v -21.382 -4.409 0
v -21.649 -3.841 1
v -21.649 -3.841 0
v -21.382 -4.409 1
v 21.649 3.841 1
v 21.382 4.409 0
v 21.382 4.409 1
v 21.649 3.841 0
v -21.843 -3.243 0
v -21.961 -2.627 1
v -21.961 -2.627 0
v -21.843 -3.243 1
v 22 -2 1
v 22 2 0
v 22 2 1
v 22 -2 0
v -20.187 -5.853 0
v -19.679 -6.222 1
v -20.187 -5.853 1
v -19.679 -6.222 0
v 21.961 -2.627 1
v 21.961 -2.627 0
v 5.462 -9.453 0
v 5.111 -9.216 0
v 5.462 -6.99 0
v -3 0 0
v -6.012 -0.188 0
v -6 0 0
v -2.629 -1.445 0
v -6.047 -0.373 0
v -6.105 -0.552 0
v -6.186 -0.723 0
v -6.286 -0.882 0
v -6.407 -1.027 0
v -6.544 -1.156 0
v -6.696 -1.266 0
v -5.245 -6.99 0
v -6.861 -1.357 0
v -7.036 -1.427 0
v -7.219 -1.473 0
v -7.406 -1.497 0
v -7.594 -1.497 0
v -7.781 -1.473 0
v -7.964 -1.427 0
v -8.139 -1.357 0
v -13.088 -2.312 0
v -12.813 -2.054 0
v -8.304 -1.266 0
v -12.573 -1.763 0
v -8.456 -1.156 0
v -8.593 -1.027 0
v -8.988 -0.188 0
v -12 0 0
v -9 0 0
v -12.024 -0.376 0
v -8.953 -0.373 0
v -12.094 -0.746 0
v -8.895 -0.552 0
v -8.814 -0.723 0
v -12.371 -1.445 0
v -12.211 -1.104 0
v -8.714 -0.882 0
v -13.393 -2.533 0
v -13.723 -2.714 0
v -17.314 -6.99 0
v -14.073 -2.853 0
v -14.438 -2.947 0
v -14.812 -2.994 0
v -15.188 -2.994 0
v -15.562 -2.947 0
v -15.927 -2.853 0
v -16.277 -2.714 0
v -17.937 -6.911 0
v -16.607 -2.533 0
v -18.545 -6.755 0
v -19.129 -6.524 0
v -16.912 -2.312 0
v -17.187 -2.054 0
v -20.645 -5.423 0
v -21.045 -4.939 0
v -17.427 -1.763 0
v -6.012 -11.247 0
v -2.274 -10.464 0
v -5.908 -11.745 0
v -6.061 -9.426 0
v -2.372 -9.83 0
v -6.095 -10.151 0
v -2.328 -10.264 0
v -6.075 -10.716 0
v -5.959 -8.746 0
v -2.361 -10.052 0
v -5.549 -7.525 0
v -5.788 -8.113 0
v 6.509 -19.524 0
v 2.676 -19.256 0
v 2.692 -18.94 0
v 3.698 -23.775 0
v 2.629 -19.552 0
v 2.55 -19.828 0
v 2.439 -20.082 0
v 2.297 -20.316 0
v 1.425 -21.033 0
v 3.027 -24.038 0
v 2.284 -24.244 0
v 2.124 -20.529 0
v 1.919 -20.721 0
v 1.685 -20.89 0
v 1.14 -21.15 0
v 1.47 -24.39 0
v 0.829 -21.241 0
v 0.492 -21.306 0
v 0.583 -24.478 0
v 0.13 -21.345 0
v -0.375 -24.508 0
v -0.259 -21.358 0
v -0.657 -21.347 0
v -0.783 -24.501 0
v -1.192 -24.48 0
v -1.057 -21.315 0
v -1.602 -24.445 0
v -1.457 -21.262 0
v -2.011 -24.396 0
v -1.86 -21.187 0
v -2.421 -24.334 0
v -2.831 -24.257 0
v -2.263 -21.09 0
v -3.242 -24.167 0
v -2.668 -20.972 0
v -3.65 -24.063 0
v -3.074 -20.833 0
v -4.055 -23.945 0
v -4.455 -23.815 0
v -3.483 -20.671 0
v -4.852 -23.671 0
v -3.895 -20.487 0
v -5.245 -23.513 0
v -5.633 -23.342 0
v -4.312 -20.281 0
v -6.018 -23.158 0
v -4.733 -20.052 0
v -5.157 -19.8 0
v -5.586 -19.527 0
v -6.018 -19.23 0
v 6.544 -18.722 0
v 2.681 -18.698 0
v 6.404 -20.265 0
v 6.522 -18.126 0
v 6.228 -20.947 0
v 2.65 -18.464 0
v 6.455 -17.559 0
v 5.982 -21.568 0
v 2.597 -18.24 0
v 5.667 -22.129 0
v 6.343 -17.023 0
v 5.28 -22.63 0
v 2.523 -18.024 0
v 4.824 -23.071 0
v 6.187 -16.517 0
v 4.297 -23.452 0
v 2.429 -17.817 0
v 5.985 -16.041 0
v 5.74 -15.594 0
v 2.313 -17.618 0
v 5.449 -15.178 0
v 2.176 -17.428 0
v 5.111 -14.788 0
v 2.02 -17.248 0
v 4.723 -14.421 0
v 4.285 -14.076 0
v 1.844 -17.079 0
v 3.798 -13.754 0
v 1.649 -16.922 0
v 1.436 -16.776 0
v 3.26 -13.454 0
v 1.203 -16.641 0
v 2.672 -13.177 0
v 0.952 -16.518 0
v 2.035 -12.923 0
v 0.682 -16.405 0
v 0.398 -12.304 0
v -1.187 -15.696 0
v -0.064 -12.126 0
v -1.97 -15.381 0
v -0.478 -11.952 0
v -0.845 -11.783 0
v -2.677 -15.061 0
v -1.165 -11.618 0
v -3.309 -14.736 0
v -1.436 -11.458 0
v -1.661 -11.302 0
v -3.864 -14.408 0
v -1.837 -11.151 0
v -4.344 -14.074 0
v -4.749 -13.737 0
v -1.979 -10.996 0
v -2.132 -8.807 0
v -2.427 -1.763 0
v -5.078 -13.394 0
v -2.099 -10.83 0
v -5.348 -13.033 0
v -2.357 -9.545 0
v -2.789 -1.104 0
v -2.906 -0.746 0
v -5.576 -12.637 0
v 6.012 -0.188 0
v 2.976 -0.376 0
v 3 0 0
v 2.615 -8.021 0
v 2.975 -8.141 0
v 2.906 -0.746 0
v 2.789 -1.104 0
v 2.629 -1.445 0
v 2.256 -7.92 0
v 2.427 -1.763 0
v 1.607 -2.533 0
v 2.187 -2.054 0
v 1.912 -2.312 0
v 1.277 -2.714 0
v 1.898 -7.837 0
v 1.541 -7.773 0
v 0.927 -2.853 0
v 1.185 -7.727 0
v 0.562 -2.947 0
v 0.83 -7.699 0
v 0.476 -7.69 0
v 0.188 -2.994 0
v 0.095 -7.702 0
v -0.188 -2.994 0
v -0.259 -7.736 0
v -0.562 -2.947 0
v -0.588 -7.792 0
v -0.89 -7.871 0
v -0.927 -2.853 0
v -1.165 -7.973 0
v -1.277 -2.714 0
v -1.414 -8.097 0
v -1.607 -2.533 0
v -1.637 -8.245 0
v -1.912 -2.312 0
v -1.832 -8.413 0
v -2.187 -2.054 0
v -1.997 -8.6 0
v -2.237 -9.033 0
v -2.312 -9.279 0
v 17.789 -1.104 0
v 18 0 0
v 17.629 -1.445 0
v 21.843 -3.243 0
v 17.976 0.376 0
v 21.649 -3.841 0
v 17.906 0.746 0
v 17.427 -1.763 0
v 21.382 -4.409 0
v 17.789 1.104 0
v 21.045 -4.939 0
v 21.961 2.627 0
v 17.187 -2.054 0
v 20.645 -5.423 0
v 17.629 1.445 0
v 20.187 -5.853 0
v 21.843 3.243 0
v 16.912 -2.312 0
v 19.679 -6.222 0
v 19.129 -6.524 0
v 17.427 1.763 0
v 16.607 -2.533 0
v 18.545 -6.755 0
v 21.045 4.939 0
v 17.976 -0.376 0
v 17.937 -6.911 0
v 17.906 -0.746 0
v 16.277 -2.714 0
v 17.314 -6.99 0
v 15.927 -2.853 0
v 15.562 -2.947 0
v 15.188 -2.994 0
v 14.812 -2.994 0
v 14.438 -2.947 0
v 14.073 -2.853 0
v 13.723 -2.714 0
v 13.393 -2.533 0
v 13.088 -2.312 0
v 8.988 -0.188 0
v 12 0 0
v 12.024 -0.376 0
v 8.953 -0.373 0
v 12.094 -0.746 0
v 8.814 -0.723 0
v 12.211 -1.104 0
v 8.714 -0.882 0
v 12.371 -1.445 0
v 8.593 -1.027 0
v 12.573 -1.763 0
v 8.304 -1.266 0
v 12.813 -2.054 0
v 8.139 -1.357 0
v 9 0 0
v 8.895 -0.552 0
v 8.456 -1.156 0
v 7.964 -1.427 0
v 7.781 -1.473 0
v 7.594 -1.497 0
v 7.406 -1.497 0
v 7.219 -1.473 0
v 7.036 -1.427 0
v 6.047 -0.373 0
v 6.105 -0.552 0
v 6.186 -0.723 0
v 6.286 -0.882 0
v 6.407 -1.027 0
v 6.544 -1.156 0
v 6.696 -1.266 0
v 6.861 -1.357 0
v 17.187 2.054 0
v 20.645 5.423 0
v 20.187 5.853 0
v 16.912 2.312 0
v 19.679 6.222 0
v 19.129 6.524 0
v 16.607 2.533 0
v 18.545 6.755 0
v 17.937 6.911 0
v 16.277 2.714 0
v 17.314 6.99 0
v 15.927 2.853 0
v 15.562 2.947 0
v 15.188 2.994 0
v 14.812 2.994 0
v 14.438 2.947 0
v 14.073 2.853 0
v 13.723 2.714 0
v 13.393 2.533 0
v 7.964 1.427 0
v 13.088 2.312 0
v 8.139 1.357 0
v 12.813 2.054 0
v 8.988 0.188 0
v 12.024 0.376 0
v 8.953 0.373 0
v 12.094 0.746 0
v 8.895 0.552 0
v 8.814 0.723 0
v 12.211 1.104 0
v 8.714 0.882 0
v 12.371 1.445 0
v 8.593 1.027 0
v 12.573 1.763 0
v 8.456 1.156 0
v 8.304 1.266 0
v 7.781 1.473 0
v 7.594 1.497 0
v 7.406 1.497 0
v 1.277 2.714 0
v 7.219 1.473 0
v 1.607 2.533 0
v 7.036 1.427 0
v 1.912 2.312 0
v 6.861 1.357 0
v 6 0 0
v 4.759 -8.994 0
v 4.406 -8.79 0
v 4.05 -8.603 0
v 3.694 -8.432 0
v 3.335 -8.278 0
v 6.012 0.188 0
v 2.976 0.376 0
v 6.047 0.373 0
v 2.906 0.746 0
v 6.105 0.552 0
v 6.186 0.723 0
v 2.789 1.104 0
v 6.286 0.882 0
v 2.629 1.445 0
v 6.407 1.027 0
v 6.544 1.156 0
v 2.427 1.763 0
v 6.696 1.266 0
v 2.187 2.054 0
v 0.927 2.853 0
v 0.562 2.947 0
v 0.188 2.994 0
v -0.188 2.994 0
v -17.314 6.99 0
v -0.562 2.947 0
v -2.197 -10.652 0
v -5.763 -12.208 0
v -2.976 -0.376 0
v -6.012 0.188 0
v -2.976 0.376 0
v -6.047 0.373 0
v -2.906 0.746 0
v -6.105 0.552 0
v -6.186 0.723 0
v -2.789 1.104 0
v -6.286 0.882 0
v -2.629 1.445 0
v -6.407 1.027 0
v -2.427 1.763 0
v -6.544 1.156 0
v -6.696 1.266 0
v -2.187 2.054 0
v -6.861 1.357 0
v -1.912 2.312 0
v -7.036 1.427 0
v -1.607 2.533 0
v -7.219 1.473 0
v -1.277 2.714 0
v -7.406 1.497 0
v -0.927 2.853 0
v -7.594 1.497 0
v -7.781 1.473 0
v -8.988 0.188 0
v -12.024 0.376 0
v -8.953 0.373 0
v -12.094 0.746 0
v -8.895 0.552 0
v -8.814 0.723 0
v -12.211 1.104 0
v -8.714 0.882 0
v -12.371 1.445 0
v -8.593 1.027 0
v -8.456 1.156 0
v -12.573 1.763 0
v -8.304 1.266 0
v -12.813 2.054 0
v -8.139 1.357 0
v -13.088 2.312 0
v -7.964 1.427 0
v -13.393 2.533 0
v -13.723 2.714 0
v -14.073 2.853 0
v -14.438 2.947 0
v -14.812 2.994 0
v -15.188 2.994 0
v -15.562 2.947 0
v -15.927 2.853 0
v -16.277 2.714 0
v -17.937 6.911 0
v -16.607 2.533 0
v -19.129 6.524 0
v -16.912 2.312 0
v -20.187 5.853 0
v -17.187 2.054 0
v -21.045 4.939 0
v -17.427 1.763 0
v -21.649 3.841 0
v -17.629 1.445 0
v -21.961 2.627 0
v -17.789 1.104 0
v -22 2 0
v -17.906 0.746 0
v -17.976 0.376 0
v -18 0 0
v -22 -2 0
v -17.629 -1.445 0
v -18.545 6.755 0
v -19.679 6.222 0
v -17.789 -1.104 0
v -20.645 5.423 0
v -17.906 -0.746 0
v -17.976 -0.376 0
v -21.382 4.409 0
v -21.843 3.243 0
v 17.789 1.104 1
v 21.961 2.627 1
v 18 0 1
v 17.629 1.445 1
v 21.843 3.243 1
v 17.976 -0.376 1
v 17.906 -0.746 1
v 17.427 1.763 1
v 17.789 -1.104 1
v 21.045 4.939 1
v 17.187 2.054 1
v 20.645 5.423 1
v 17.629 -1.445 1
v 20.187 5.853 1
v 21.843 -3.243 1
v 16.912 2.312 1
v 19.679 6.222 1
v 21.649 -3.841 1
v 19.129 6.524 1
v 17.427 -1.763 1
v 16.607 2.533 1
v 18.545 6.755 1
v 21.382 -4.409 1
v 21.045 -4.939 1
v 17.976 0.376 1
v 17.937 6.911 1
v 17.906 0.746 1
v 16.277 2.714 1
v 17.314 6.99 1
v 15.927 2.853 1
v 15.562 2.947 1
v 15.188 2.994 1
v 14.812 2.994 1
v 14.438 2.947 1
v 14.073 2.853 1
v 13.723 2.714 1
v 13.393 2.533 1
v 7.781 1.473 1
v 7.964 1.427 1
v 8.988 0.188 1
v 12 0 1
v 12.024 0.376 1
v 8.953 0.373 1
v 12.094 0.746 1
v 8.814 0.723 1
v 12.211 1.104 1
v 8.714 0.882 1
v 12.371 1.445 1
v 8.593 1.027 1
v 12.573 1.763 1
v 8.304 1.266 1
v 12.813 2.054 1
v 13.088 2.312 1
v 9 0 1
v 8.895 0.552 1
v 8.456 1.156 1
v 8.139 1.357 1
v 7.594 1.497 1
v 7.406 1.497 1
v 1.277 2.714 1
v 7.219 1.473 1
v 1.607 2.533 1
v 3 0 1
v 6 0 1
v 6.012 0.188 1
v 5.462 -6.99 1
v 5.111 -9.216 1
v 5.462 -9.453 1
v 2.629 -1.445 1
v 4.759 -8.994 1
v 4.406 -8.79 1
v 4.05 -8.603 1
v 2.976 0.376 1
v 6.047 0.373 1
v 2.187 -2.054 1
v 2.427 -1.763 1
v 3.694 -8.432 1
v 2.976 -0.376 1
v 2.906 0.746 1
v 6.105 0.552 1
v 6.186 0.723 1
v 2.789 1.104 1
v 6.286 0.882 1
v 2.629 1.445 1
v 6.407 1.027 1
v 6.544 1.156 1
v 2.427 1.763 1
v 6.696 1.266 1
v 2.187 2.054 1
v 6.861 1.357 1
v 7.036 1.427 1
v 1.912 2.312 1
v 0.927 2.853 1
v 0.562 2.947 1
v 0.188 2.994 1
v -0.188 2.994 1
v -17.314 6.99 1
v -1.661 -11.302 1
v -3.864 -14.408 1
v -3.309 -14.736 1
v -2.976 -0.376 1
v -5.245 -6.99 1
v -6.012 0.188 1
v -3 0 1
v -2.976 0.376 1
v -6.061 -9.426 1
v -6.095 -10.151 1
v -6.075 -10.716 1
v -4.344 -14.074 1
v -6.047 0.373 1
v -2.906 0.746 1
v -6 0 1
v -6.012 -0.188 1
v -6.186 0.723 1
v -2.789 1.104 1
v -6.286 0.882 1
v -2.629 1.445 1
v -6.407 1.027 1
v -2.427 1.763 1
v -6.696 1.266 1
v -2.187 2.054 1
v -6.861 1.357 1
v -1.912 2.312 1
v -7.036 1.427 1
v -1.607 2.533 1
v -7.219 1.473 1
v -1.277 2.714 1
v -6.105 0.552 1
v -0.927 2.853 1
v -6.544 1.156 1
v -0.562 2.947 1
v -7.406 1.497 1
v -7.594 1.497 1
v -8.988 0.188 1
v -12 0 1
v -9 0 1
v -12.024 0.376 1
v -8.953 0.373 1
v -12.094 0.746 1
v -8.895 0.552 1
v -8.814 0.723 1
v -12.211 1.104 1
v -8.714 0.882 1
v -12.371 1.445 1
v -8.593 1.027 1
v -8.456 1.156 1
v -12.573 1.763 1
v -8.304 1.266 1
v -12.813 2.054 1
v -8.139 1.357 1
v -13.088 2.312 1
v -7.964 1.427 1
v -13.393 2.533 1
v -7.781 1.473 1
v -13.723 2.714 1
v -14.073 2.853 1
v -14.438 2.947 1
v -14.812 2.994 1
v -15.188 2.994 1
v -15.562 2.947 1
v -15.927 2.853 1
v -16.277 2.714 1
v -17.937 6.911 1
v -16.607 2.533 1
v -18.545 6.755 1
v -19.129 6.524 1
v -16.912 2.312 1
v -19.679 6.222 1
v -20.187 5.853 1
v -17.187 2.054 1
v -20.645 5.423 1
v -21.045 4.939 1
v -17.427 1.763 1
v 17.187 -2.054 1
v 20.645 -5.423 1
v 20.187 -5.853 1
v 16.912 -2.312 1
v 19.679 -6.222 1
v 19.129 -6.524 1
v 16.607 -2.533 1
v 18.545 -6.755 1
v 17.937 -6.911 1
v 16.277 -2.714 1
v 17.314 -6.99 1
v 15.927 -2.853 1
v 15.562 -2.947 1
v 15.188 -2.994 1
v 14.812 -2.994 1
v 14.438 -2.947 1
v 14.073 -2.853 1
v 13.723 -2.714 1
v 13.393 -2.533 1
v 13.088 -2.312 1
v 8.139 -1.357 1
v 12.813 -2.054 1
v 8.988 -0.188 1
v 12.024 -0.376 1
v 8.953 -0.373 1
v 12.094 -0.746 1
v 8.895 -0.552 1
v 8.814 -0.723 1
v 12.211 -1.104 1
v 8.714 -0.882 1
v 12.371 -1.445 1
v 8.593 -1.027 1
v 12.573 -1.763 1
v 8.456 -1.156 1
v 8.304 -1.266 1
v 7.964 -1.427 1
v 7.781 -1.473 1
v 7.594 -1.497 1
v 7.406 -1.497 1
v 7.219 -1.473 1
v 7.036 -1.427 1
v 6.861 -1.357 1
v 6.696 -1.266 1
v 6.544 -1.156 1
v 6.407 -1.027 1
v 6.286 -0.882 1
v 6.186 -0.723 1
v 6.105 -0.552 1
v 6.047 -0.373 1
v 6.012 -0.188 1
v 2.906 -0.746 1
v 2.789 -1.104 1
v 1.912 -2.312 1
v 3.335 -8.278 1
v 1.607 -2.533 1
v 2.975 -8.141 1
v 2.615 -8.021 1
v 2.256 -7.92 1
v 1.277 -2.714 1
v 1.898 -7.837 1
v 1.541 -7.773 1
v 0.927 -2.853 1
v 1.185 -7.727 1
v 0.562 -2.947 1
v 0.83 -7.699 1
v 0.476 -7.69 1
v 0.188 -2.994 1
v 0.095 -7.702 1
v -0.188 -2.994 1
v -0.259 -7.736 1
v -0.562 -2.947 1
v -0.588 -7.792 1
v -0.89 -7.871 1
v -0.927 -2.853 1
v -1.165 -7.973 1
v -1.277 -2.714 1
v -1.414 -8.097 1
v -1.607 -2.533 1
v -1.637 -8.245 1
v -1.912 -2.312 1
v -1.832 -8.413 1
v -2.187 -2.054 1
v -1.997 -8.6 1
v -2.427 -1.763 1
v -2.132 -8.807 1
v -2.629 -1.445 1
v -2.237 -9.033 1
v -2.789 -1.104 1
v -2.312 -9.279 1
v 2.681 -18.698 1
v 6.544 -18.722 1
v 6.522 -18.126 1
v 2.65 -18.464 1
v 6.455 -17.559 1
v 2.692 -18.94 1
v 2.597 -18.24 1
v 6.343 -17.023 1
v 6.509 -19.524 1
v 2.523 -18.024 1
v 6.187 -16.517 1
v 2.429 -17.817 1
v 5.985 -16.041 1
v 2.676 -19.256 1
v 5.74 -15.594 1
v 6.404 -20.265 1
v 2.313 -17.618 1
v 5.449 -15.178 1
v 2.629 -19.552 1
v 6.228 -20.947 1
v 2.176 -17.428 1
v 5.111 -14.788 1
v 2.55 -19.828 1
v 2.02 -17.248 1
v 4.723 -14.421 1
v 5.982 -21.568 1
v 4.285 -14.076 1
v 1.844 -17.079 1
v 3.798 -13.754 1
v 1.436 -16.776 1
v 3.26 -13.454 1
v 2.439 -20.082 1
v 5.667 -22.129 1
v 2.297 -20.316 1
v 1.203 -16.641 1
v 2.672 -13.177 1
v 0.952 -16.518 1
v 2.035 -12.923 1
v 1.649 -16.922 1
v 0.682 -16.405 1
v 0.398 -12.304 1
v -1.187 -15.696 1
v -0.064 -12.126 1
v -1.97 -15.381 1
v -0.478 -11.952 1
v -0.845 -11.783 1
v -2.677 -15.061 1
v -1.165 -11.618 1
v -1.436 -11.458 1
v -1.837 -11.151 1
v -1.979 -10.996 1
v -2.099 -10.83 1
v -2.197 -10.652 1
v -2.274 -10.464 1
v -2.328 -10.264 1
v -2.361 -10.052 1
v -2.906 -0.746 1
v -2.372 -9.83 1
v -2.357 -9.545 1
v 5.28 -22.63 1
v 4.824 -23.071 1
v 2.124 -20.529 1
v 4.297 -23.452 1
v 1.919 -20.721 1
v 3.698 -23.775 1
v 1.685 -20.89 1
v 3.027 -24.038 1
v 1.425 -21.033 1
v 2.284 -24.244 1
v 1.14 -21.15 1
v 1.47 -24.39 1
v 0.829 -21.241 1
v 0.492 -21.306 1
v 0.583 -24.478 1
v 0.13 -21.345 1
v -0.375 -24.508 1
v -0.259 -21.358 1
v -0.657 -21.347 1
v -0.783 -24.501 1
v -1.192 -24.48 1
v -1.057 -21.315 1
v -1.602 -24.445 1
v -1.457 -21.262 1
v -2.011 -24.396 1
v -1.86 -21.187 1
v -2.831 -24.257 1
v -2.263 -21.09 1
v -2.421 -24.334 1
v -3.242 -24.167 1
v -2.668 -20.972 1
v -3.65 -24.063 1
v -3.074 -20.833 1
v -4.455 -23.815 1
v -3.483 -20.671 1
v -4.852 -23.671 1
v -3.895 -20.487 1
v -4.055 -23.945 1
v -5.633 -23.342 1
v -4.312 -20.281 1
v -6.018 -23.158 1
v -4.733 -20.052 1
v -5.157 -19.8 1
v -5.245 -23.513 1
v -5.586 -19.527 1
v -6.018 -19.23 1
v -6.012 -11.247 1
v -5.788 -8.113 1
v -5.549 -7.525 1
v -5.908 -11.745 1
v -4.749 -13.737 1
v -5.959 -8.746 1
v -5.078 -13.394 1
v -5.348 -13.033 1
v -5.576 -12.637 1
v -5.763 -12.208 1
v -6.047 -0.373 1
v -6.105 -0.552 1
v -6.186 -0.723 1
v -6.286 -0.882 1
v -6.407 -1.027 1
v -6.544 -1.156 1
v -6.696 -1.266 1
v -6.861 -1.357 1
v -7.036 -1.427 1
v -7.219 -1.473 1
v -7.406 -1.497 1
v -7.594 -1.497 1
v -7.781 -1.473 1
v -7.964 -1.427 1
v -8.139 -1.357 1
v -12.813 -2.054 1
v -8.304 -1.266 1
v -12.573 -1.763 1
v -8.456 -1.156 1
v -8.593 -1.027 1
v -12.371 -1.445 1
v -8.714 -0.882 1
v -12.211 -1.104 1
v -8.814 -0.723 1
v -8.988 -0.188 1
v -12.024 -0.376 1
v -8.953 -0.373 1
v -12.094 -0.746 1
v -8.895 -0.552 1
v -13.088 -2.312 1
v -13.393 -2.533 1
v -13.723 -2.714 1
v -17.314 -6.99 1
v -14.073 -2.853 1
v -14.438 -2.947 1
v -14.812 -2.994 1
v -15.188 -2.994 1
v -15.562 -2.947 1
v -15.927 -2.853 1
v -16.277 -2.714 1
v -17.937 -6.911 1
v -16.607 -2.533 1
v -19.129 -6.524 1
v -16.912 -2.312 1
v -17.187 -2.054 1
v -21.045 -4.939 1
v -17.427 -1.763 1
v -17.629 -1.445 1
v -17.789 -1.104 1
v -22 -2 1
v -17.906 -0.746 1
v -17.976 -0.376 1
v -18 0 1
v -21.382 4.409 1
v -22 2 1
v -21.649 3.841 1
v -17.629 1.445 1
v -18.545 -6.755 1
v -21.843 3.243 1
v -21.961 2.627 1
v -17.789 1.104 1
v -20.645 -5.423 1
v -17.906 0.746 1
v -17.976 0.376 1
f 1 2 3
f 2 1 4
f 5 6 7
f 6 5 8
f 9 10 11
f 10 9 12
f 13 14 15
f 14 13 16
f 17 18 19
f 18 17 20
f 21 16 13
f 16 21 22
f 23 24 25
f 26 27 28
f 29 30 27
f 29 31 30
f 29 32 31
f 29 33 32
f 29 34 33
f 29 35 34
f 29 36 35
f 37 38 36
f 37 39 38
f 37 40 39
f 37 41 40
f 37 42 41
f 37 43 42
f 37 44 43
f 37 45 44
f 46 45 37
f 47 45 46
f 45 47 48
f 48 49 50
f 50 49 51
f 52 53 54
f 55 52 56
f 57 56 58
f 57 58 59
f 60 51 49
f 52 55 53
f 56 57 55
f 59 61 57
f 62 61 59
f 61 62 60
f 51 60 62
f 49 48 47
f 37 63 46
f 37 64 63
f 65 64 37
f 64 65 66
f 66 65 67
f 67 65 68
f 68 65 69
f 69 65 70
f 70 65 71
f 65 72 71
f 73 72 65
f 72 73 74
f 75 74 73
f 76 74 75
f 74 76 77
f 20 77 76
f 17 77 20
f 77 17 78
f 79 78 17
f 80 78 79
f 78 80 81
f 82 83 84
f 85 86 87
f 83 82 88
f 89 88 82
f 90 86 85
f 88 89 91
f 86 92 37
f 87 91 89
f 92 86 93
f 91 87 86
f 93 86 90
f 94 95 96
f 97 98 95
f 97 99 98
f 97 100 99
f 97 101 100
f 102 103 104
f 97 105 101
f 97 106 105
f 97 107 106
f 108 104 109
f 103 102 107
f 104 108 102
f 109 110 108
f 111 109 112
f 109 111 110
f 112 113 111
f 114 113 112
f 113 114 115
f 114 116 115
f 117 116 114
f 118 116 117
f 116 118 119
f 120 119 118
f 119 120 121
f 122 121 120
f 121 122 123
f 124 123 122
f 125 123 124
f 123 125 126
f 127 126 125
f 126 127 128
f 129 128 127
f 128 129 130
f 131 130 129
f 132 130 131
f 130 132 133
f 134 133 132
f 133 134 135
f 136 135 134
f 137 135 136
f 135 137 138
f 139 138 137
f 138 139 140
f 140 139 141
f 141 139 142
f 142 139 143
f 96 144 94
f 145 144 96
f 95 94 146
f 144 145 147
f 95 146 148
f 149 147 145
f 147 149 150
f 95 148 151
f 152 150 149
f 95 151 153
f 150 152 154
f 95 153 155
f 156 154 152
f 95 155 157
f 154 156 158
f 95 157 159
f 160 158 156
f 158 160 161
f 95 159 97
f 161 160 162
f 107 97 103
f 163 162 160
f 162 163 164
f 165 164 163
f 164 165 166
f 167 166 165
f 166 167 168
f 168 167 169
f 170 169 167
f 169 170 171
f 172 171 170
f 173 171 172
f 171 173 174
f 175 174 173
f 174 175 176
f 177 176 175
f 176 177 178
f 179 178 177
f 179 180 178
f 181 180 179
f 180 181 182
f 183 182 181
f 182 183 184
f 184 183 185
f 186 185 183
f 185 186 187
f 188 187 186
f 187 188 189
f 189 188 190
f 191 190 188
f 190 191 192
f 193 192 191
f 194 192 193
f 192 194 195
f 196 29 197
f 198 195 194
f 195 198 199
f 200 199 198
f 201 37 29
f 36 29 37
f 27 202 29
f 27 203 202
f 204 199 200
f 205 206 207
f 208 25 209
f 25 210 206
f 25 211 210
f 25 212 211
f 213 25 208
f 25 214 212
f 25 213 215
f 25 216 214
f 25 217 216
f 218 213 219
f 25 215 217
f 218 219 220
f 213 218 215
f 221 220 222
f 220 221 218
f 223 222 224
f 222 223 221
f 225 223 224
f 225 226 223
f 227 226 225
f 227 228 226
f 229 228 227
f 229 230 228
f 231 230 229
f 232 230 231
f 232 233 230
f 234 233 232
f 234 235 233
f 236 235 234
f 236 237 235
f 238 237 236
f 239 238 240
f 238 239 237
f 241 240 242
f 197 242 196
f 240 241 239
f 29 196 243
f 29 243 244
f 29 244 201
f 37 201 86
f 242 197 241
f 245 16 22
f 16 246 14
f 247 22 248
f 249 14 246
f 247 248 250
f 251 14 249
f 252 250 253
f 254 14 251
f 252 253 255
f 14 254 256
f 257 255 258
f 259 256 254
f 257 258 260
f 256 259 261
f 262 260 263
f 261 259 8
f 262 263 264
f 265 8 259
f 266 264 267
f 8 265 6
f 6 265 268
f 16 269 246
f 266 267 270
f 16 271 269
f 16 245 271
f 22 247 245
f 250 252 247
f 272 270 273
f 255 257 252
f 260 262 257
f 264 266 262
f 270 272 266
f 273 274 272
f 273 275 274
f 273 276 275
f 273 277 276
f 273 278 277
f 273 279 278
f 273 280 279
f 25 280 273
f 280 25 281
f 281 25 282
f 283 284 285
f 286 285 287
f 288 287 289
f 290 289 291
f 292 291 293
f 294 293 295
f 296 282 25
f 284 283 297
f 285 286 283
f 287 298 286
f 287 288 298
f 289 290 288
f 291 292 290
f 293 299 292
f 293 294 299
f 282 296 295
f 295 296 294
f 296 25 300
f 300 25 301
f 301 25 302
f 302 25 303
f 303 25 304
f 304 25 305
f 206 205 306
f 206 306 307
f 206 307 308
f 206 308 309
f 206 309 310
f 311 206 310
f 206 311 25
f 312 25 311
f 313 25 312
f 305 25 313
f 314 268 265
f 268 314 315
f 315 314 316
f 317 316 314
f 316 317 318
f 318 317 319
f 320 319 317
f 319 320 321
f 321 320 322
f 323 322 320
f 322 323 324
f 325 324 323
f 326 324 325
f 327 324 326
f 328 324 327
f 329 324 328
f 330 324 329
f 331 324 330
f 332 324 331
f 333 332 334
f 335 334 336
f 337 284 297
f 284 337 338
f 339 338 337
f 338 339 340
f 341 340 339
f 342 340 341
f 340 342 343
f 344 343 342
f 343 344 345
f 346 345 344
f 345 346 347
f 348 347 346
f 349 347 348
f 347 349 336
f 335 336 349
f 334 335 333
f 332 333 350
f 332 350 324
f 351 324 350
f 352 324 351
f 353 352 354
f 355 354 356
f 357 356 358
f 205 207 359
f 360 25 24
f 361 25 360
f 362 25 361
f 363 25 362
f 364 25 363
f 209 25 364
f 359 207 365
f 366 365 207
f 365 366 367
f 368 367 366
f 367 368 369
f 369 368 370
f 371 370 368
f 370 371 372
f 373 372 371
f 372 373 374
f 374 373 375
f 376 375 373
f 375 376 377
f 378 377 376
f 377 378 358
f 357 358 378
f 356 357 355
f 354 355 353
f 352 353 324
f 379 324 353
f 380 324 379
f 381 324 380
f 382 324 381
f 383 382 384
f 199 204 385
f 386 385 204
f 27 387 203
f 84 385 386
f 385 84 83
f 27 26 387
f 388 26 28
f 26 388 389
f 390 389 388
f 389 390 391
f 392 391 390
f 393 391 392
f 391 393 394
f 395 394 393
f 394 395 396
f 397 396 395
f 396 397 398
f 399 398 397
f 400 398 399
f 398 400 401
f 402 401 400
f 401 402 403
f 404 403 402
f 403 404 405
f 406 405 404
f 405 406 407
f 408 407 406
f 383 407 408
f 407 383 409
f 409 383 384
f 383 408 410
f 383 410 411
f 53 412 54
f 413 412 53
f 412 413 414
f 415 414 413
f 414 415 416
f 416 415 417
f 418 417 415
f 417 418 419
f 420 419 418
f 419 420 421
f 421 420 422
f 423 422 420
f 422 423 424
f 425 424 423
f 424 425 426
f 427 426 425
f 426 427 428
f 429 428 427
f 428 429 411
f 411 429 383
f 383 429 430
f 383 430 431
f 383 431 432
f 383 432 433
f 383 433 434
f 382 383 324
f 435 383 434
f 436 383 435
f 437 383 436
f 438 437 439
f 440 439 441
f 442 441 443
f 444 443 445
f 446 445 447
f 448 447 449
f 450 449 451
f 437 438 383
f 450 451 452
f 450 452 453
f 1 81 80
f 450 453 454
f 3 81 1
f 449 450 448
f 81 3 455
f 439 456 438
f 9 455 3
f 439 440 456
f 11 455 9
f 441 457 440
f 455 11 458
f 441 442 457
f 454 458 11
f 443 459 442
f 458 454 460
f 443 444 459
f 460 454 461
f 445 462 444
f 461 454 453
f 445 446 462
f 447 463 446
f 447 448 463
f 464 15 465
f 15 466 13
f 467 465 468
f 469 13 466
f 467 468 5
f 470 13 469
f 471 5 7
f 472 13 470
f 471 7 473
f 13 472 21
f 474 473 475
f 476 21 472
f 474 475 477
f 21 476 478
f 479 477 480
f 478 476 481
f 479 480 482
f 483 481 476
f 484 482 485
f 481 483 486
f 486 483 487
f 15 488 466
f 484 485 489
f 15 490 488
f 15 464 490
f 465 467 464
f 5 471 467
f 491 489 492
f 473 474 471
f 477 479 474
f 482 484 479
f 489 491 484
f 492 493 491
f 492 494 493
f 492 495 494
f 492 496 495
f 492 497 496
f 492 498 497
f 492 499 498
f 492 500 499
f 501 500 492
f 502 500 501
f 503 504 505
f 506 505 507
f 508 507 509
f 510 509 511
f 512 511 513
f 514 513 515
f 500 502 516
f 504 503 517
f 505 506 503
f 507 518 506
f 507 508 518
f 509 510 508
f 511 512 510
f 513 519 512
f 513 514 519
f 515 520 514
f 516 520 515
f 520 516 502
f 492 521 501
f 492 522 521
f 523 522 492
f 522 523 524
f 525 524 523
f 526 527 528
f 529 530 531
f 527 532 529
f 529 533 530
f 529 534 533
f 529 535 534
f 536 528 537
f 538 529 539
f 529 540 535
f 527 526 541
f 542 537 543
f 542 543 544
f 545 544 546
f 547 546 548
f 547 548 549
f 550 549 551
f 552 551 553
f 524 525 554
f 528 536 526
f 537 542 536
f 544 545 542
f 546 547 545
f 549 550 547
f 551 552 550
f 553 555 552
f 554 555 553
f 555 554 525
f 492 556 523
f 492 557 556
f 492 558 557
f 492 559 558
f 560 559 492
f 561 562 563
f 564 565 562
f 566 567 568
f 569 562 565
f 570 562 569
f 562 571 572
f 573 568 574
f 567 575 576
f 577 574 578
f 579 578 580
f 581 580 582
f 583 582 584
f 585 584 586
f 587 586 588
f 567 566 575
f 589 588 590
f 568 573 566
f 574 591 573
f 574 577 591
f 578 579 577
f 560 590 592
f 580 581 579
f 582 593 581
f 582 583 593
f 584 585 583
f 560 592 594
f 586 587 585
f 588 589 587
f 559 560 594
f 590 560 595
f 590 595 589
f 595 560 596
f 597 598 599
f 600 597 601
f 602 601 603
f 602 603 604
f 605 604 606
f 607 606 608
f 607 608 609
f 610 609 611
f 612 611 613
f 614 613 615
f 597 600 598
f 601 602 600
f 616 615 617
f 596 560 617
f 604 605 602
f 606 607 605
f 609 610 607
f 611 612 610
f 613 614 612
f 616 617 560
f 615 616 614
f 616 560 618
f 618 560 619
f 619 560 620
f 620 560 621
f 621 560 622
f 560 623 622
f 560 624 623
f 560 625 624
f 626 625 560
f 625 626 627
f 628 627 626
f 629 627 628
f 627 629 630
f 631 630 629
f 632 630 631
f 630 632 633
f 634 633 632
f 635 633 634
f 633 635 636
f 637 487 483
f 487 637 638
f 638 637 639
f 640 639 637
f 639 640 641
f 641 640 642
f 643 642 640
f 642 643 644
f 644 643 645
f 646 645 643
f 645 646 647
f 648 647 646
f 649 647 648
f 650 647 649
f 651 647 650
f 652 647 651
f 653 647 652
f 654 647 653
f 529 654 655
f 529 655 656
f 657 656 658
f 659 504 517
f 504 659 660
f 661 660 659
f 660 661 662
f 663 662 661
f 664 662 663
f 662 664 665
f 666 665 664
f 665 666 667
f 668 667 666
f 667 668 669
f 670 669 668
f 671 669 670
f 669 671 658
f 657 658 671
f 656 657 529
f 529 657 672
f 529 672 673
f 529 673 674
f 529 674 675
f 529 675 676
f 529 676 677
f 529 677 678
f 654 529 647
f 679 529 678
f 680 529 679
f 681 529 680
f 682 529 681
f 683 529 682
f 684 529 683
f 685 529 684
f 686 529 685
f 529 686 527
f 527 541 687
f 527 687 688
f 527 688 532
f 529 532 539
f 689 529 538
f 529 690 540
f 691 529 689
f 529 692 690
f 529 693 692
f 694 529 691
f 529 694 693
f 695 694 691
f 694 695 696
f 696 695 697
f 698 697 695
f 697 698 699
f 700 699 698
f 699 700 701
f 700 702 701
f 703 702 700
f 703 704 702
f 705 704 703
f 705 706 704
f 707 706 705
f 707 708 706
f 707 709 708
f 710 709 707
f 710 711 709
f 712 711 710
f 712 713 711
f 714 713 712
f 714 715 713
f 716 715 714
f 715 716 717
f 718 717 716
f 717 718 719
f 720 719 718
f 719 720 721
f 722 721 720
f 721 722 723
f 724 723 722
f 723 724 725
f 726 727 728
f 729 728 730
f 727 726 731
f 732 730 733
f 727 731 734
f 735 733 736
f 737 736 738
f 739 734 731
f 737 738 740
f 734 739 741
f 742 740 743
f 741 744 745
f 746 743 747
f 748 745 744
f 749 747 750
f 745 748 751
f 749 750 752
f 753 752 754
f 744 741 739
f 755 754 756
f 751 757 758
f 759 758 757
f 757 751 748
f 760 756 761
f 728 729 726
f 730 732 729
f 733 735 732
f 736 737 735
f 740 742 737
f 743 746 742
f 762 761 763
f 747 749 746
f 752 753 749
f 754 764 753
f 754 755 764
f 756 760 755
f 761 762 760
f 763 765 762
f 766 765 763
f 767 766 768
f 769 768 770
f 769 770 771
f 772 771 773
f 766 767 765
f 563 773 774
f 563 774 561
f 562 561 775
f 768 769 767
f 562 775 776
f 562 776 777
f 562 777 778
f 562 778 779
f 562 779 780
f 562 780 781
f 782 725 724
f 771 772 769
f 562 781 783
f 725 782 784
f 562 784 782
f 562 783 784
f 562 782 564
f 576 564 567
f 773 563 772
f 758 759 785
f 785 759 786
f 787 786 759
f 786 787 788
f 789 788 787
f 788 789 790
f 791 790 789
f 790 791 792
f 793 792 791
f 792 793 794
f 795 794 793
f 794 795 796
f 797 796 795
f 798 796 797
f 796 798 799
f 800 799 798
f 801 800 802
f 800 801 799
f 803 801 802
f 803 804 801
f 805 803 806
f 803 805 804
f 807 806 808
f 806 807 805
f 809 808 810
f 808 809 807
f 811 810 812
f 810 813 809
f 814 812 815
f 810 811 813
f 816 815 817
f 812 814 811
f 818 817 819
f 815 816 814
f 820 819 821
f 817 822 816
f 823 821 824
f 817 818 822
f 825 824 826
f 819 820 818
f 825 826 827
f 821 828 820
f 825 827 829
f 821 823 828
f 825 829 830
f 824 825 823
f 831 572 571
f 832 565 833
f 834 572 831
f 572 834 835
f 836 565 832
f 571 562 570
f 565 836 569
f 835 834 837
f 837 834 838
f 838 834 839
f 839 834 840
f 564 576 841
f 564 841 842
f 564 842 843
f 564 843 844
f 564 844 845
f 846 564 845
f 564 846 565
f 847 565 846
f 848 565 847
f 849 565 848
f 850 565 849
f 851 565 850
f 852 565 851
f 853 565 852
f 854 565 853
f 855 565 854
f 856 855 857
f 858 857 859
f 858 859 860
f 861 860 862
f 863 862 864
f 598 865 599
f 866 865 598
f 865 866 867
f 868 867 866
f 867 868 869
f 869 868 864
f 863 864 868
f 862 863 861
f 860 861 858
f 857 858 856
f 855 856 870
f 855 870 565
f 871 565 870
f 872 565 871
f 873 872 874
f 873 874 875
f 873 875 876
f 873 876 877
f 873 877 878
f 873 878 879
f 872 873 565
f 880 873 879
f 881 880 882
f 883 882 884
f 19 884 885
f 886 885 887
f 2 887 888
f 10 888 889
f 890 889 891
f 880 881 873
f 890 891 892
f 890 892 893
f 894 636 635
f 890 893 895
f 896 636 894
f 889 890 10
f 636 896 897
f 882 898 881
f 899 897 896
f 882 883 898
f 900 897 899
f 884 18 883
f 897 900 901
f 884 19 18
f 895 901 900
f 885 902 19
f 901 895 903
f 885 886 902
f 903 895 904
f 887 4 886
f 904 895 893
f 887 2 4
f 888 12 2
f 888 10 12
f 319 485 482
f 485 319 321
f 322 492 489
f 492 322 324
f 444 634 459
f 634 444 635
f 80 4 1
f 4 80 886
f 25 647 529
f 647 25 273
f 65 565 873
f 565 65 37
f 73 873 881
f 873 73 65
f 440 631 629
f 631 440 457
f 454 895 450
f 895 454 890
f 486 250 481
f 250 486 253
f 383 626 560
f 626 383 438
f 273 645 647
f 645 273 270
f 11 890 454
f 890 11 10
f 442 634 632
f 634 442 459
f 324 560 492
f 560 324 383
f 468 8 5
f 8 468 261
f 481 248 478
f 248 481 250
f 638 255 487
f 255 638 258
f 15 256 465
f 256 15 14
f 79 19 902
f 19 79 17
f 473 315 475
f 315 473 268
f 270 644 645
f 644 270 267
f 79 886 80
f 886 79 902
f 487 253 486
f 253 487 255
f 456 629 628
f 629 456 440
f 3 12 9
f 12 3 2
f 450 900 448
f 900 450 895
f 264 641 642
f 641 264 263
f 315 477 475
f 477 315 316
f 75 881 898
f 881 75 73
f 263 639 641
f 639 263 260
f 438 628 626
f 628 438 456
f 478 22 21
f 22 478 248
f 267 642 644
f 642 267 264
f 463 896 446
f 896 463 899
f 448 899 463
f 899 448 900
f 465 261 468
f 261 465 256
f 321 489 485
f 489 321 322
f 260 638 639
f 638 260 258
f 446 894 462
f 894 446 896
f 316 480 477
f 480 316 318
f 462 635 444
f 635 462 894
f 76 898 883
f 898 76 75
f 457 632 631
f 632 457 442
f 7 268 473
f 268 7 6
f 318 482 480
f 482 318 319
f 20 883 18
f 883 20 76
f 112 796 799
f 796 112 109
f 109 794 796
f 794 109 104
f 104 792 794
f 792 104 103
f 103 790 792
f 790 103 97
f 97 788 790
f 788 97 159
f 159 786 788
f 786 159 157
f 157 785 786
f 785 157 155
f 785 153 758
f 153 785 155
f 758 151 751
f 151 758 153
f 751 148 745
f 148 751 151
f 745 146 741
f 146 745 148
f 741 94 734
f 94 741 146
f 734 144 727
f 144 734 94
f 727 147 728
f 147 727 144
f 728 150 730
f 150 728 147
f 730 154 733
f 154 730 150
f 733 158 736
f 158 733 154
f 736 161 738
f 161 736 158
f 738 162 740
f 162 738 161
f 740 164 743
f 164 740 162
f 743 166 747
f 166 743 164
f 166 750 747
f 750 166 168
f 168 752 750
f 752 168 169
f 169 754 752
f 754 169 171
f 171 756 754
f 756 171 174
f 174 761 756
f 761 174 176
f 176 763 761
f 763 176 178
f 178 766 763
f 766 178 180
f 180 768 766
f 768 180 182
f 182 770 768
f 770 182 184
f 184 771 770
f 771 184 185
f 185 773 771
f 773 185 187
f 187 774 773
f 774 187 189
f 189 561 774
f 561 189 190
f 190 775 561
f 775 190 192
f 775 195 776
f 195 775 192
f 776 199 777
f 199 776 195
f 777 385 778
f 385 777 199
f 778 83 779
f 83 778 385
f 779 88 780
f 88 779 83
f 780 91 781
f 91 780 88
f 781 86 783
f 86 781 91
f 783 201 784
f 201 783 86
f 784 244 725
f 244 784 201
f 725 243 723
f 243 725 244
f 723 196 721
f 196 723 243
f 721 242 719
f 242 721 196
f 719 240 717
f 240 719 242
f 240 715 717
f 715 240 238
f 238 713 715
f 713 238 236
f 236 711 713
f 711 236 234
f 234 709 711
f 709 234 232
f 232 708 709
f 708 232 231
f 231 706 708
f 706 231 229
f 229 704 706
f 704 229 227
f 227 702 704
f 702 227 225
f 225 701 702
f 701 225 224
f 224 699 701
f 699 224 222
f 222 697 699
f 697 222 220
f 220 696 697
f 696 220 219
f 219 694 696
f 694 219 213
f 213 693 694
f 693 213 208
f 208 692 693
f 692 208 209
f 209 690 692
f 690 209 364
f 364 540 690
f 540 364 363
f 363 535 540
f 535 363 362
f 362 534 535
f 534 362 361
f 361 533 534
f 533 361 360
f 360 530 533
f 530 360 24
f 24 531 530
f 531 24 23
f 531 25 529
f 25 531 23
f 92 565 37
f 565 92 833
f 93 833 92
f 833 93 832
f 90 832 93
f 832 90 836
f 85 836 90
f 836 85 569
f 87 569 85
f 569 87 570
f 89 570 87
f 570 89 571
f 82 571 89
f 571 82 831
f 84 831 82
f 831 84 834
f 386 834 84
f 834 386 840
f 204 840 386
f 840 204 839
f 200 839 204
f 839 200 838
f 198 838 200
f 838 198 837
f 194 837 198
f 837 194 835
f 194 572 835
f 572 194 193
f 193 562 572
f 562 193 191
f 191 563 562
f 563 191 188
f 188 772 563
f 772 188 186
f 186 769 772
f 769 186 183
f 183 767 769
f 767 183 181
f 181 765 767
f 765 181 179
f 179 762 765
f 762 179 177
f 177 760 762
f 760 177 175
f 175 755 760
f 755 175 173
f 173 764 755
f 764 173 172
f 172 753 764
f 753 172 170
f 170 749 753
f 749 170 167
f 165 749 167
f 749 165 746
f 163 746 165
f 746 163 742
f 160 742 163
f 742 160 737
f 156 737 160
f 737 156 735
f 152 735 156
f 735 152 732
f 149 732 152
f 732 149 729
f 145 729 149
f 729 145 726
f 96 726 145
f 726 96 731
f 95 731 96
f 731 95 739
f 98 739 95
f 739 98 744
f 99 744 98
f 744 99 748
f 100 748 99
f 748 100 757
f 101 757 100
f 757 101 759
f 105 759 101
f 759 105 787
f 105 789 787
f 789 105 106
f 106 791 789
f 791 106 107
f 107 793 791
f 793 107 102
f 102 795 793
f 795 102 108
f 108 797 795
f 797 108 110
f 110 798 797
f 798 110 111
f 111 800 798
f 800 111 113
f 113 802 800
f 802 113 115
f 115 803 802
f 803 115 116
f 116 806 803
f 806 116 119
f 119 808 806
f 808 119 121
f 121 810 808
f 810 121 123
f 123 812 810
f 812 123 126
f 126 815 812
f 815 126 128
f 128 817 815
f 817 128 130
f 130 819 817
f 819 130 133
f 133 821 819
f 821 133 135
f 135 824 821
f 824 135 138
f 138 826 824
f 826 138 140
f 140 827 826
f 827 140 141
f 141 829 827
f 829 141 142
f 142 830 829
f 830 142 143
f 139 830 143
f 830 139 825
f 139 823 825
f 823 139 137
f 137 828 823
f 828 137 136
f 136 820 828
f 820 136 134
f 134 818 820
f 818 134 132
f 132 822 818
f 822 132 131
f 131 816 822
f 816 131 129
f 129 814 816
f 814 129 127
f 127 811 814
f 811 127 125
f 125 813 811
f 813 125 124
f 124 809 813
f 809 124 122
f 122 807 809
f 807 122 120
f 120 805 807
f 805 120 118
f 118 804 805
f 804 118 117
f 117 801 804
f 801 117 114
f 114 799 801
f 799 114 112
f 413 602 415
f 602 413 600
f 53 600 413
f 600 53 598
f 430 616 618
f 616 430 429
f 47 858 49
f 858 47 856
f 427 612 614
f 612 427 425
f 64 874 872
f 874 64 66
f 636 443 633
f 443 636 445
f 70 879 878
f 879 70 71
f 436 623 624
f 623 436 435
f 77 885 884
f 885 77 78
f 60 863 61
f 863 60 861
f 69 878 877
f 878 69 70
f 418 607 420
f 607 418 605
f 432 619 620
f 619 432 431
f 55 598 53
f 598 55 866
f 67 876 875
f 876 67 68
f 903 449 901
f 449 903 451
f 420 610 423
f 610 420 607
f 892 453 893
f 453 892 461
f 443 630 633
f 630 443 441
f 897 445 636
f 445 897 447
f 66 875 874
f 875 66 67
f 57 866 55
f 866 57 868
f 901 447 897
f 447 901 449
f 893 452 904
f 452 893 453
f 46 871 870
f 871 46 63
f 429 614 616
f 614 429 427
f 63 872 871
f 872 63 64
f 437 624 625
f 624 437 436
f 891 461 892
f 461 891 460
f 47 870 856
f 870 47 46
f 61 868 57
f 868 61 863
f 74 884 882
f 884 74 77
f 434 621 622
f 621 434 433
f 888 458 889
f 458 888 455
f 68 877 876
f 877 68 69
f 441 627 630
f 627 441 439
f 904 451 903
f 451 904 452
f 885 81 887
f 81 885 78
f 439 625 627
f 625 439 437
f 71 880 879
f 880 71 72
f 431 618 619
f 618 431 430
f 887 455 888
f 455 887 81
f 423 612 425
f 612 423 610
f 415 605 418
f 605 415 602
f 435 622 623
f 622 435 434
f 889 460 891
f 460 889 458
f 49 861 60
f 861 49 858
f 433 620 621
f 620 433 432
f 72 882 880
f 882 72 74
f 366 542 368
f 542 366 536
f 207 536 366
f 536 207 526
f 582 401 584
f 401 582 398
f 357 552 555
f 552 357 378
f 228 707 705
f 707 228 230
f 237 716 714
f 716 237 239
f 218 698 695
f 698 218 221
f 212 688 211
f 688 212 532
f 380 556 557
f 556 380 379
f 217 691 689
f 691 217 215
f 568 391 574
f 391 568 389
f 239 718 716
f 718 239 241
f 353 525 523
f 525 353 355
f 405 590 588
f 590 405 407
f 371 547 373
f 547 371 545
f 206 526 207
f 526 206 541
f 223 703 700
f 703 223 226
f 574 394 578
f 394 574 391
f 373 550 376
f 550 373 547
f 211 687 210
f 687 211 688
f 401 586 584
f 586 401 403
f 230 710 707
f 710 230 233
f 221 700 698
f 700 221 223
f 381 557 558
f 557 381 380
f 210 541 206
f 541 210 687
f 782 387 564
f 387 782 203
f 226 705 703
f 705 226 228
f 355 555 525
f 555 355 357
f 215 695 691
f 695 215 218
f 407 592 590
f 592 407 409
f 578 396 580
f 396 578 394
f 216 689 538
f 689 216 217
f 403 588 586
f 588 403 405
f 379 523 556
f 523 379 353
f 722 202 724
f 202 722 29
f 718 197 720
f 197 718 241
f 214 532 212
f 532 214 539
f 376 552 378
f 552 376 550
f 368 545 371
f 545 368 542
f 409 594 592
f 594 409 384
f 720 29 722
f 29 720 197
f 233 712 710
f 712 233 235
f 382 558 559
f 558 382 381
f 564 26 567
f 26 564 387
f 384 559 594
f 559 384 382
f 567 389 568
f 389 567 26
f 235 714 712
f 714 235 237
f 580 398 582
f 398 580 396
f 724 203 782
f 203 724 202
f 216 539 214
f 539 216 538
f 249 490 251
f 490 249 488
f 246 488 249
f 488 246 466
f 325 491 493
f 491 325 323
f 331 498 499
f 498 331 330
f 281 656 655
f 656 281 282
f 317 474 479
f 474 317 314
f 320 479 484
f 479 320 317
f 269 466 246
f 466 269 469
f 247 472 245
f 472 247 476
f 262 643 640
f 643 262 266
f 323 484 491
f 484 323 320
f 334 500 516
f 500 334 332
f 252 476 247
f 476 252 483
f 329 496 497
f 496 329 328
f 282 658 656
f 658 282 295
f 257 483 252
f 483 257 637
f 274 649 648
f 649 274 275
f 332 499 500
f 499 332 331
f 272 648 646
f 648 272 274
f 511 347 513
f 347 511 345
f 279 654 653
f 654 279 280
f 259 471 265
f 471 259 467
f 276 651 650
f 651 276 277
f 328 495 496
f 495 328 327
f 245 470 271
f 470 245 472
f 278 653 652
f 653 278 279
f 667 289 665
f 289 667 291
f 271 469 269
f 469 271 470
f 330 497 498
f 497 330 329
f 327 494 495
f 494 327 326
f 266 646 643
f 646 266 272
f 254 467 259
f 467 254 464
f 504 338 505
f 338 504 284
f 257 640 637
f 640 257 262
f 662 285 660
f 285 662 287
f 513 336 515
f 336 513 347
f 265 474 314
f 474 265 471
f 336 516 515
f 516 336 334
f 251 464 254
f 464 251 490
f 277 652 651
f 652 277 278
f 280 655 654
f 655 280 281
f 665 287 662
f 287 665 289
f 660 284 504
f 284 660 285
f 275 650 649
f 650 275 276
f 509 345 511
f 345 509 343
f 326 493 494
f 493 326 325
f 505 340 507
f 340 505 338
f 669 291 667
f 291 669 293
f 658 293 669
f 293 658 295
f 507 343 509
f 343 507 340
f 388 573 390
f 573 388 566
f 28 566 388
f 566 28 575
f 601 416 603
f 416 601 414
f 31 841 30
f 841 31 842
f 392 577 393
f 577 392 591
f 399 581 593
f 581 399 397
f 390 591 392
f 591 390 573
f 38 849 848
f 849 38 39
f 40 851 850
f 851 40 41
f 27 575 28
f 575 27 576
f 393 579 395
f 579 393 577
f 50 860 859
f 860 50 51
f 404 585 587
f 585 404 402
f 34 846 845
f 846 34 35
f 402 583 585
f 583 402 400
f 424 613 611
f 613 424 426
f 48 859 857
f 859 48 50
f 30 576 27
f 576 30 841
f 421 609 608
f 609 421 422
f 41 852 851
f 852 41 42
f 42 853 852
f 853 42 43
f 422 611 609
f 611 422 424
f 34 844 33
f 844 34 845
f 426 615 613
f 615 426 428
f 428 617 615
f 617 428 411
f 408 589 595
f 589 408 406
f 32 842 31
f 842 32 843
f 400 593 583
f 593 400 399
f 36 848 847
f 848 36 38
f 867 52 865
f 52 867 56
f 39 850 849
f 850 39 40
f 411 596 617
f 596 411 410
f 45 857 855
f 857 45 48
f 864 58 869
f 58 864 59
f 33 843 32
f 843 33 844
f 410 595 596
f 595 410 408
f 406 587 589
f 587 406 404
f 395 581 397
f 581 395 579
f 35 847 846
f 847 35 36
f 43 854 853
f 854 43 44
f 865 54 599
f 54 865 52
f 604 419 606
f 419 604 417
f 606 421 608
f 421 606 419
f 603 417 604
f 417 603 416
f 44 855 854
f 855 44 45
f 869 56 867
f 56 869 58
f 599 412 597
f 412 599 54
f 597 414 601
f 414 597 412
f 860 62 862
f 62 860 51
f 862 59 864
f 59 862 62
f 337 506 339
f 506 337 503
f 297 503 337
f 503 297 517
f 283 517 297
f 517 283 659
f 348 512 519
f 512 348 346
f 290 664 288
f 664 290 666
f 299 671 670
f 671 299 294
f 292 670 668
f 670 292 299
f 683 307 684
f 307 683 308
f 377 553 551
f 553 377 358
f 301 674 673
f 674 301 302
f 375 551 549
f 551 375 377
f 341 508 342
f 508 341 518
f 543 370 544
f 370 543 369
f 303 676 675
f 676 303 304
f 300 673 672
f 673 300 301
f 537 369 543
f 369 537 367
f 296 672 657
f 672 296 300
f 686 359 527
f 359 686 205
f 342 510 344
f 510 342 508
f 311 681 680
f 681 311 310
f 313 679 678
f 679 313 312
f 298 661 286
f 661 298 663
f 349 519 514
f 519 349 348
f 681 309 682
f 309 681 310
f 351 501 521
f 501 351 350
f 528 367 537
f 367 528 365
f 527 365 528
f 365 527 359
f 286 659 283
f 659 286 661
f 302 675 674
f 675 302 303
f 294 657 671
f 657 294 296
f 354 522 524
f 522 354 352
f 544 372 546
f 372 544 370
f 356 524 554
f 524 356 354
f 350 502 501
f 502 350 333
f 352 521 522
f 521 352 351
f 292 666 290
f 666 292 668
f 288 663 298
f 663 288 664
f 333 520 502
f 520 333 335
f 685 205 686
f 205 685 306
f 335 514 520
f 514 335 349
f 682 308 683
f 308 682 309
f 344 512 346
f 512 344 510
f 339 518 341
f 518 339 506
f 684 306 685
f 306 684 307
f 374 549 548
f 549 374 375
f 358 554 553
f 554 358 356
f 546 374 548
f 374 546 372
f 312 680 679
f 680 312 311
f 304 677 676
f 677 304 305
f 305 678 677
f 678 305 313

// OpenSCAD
$fn = 50;


difference() {
	union() {
		hull() {
			translate(v = [-17.0000000000, 2.0000000000, 0]) {
				cylinder(h = 1, r = 5);
			}
			translate(v = [17.0000000000, 2.0000000000, 0]) {
				cylinder(h = 1, r = 5);
			}
			translate(v = [-17.0000000000, -2.0000000000, 0]) {
				cylinder(h = 1, r = 5);
			}
			translate(v = [17.0000000000, -2.0000000000, 0]) {
				cylinder(h = 1, r = 5);
			}
		}
		translate(v = [0, -5, 0]) {
			linear_extrude(height = 1) {
				text(font = "DejaVu Sans Mono:style=Bold", halign = "center", size = 19.0000000000, text = "S", valign = "top");
			}
		}
	}
	union() {
		translate(v = [-15.0000000000, 0.0000000000, 0]) {
			translate(v = [0, 0, -100]) {
				cylinder(h = 200, r = 3.0000000000);
			}
		}
		translate(v = [0, 0, -100]) {
			cylinder(h = 200, r = 3.0000000000);
		}
		translate(v = [15.0000000000, 0.0000000000, 0]) {
			translate(v = [0, 0, -100]) {
				cylinder(h = 200, r = 3.0000000000);
			}
		}
		translate(v = [-15.0000000000, 0.0000000000, 0]) {
			translate(v = [0, 0, -100]) {
				cylinder(h = 200, r = 1.5000000000);
			}
		}
		translate(v = [-7.5000000000, 0.0000000000, 0]) {
			translate(v = [0, 0, -100]) {
				cylinder(h = 200, r = 1.5000000000);
			}
		}
		translate(v = [0, 0, -100]) {
			cylinder(h = 200, r = 1.5000000000);
		}
		translate(v = [7.5000000000, 0.0000000000, 0]) {
			translate(v = [0, 0, -100]) {
				cylinder(h = 200, r = 1.5000000000);
			}
		}
		translate(v = [15.0000000000, 0.0000000000, 0]) {
			translate(v = [0, 0, -100]) {
				cylinder(h = 200, r = 1.5000000000);
			}
		}
	}
}
